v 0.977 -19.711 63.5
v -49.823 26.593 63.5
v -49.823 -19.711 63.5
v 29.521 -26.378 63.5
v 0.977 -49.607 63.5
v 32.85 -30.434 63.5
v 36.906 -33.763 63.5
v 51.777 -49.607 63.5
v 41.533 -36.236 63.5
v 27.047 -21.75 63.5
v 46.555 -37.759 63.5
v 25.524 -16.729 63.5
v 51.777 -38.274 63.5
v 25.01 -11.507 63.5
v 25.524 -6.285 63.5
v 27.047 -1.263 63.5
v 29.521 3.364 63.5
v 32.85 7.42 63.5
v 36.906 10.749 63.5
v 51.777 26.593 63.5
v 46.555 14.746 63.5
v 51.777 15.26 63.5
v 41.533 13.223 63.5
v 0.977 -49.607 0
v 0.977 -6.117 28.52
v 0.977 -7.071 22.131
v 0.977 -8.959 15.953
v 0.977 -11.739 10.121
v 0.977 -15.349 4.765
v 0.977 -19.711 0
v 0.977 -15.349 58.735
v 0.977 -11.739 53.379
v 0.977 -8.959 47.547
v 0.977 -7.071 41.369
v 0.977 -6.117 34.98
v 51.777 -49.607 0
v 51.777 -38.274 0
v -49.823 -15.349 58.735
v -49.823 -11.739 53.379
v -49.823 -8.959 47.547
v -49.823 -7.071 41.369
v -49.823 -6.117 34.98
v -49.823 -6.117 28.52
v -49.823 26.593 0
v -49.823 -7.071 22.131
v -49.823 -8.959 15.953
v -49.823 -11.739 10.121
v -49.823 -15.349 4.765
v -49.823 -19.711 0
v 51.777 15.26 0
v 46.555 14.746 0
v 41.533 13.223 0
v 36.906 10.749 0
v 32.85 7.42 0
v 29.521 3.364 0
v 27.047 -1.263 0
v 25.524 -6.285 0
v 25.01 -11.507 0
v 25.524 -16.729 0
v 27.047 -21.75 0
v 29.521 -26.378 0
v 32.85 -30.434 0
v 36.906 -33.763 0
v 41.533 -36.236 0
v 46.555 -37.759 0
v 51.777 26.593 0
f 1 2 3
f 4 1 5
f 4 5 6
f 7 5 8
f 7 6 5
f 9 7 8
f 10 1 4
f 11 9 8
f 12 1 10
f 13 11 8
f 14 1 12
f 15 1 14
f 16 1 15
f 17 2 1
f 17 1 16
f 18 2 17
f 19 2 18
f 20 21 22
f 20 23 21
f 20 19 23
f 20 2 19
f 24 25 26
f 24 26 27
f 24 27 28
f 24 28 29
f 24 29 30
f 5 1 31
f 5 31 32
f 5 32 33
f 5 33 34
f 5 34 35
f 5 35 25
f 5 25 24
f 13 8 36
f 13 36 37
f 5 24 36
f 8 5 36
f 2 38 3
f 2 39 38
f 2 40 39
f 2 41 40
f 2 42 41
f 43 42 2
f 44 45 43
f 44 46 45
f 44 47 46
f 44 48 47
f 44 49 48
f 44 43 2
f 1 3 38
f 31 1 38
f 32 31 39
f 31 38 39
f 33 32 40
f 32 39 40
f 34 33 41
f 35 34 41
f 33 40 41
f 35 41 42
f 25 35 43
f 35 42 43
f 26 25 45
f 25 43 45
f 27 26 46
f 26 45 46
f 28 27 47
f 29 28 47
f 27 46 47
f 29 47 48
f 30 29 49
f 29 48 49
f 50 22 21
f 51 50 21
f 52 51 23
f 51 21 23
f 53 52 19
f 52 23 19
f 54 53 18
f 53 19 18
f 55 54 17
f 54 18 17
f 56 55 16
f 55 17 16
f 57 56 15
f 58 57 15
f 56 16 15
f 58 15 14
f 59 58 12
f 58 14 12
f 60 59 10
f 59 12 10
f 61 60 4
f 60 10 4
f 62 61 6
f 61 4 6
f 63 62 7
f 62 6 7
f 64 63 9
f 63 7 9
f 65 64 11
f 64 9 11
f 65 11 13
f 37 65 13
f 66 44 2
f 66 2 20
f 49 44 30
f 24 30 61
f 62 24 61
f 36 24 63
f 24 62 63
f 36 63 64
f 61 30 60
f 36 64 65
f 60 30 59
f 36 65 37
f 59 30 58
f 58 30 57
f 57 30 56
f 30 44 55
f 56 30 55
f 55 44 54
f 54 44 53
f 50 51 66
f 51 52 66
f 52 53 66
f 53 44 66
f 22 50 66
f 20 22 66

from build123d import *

# Parameters (mm, degrees)
F0_W     = 101.6
F0_H     = 76.2
F1_DEPTH = 63.5
F3_DEPTH = 63.501
F5_DEPTH = 50.8


with BuildPart() as f1:
    # F0 (on Top) → F1 (new body)
    with BuildSketch(Plane.XY):
        with Locations((0.976678, -11.506712)):
            Rectangle(F0_W, F0_H)
    extrude(amount=F1_DEPTH)

    # F2 (on face) → F3 (cut, through all)
    with BuildSketch(Plane.XY.offset(63.5)):
        with BuildLine():
            Line((51.776678, -38.273564), (51.776678, 15.26014))
            ThreePointArc((51.776678, 15.26014), (25.009826, -11.506712), (51.776678, -38.273564))
        make_face()
        with BuildLine():
            ThreePointArc((51.776678, -38.273564), (70.7037, -30.433734), (78.54353, -11.506712))
            ThreePointArc((78.54353, -11.506712), (70.7037, 7.420311), (51.776678, 15.26014))
            Line((51.776678, 15.26014), (51.776678, -38.273564))
        make_face()
    extrude(amount=-F3_DEPTH, mode=Mode.SUBTRACT)

    # F4 (on face) → F5 (cut)
    with BuildSketch(Plane(origin=(-49.823322, 0, 0), x_dir=(0, -1, 0), z_dir=(-1, 0, 0))):
        with BuildLine():
            Line((49.606712, 63.5), (19.711442, 63.5))
            ThreePointArc((19.711442, 63.5), (5.997199, 31.75), (19.711442, 0))
            Line((19.711442, 0), (49.606712, 0))
            Line((49.606712, 0), (49.606712, 63.5))
        make_face()
        with BuildLine():
            ThreePointArc((19.711442, 0), (66.899362, -8.284409), (93.216225, 31.75))
            ThreePointArc((93.216225, 31.75), (66.899362, 71.784409), (19.711442, 63.5))
            Line((19.711442, 63.5), (49.606712, 63.5))
            Line((49.606712, 63.5), (49.606712, 0))
            Line((49.606712, 0), (19.711442, 0))
        make_face()
    extrude(amount=-F5_DEPTH, mode=Mode.SUBTRACT)


solid = f1.part
